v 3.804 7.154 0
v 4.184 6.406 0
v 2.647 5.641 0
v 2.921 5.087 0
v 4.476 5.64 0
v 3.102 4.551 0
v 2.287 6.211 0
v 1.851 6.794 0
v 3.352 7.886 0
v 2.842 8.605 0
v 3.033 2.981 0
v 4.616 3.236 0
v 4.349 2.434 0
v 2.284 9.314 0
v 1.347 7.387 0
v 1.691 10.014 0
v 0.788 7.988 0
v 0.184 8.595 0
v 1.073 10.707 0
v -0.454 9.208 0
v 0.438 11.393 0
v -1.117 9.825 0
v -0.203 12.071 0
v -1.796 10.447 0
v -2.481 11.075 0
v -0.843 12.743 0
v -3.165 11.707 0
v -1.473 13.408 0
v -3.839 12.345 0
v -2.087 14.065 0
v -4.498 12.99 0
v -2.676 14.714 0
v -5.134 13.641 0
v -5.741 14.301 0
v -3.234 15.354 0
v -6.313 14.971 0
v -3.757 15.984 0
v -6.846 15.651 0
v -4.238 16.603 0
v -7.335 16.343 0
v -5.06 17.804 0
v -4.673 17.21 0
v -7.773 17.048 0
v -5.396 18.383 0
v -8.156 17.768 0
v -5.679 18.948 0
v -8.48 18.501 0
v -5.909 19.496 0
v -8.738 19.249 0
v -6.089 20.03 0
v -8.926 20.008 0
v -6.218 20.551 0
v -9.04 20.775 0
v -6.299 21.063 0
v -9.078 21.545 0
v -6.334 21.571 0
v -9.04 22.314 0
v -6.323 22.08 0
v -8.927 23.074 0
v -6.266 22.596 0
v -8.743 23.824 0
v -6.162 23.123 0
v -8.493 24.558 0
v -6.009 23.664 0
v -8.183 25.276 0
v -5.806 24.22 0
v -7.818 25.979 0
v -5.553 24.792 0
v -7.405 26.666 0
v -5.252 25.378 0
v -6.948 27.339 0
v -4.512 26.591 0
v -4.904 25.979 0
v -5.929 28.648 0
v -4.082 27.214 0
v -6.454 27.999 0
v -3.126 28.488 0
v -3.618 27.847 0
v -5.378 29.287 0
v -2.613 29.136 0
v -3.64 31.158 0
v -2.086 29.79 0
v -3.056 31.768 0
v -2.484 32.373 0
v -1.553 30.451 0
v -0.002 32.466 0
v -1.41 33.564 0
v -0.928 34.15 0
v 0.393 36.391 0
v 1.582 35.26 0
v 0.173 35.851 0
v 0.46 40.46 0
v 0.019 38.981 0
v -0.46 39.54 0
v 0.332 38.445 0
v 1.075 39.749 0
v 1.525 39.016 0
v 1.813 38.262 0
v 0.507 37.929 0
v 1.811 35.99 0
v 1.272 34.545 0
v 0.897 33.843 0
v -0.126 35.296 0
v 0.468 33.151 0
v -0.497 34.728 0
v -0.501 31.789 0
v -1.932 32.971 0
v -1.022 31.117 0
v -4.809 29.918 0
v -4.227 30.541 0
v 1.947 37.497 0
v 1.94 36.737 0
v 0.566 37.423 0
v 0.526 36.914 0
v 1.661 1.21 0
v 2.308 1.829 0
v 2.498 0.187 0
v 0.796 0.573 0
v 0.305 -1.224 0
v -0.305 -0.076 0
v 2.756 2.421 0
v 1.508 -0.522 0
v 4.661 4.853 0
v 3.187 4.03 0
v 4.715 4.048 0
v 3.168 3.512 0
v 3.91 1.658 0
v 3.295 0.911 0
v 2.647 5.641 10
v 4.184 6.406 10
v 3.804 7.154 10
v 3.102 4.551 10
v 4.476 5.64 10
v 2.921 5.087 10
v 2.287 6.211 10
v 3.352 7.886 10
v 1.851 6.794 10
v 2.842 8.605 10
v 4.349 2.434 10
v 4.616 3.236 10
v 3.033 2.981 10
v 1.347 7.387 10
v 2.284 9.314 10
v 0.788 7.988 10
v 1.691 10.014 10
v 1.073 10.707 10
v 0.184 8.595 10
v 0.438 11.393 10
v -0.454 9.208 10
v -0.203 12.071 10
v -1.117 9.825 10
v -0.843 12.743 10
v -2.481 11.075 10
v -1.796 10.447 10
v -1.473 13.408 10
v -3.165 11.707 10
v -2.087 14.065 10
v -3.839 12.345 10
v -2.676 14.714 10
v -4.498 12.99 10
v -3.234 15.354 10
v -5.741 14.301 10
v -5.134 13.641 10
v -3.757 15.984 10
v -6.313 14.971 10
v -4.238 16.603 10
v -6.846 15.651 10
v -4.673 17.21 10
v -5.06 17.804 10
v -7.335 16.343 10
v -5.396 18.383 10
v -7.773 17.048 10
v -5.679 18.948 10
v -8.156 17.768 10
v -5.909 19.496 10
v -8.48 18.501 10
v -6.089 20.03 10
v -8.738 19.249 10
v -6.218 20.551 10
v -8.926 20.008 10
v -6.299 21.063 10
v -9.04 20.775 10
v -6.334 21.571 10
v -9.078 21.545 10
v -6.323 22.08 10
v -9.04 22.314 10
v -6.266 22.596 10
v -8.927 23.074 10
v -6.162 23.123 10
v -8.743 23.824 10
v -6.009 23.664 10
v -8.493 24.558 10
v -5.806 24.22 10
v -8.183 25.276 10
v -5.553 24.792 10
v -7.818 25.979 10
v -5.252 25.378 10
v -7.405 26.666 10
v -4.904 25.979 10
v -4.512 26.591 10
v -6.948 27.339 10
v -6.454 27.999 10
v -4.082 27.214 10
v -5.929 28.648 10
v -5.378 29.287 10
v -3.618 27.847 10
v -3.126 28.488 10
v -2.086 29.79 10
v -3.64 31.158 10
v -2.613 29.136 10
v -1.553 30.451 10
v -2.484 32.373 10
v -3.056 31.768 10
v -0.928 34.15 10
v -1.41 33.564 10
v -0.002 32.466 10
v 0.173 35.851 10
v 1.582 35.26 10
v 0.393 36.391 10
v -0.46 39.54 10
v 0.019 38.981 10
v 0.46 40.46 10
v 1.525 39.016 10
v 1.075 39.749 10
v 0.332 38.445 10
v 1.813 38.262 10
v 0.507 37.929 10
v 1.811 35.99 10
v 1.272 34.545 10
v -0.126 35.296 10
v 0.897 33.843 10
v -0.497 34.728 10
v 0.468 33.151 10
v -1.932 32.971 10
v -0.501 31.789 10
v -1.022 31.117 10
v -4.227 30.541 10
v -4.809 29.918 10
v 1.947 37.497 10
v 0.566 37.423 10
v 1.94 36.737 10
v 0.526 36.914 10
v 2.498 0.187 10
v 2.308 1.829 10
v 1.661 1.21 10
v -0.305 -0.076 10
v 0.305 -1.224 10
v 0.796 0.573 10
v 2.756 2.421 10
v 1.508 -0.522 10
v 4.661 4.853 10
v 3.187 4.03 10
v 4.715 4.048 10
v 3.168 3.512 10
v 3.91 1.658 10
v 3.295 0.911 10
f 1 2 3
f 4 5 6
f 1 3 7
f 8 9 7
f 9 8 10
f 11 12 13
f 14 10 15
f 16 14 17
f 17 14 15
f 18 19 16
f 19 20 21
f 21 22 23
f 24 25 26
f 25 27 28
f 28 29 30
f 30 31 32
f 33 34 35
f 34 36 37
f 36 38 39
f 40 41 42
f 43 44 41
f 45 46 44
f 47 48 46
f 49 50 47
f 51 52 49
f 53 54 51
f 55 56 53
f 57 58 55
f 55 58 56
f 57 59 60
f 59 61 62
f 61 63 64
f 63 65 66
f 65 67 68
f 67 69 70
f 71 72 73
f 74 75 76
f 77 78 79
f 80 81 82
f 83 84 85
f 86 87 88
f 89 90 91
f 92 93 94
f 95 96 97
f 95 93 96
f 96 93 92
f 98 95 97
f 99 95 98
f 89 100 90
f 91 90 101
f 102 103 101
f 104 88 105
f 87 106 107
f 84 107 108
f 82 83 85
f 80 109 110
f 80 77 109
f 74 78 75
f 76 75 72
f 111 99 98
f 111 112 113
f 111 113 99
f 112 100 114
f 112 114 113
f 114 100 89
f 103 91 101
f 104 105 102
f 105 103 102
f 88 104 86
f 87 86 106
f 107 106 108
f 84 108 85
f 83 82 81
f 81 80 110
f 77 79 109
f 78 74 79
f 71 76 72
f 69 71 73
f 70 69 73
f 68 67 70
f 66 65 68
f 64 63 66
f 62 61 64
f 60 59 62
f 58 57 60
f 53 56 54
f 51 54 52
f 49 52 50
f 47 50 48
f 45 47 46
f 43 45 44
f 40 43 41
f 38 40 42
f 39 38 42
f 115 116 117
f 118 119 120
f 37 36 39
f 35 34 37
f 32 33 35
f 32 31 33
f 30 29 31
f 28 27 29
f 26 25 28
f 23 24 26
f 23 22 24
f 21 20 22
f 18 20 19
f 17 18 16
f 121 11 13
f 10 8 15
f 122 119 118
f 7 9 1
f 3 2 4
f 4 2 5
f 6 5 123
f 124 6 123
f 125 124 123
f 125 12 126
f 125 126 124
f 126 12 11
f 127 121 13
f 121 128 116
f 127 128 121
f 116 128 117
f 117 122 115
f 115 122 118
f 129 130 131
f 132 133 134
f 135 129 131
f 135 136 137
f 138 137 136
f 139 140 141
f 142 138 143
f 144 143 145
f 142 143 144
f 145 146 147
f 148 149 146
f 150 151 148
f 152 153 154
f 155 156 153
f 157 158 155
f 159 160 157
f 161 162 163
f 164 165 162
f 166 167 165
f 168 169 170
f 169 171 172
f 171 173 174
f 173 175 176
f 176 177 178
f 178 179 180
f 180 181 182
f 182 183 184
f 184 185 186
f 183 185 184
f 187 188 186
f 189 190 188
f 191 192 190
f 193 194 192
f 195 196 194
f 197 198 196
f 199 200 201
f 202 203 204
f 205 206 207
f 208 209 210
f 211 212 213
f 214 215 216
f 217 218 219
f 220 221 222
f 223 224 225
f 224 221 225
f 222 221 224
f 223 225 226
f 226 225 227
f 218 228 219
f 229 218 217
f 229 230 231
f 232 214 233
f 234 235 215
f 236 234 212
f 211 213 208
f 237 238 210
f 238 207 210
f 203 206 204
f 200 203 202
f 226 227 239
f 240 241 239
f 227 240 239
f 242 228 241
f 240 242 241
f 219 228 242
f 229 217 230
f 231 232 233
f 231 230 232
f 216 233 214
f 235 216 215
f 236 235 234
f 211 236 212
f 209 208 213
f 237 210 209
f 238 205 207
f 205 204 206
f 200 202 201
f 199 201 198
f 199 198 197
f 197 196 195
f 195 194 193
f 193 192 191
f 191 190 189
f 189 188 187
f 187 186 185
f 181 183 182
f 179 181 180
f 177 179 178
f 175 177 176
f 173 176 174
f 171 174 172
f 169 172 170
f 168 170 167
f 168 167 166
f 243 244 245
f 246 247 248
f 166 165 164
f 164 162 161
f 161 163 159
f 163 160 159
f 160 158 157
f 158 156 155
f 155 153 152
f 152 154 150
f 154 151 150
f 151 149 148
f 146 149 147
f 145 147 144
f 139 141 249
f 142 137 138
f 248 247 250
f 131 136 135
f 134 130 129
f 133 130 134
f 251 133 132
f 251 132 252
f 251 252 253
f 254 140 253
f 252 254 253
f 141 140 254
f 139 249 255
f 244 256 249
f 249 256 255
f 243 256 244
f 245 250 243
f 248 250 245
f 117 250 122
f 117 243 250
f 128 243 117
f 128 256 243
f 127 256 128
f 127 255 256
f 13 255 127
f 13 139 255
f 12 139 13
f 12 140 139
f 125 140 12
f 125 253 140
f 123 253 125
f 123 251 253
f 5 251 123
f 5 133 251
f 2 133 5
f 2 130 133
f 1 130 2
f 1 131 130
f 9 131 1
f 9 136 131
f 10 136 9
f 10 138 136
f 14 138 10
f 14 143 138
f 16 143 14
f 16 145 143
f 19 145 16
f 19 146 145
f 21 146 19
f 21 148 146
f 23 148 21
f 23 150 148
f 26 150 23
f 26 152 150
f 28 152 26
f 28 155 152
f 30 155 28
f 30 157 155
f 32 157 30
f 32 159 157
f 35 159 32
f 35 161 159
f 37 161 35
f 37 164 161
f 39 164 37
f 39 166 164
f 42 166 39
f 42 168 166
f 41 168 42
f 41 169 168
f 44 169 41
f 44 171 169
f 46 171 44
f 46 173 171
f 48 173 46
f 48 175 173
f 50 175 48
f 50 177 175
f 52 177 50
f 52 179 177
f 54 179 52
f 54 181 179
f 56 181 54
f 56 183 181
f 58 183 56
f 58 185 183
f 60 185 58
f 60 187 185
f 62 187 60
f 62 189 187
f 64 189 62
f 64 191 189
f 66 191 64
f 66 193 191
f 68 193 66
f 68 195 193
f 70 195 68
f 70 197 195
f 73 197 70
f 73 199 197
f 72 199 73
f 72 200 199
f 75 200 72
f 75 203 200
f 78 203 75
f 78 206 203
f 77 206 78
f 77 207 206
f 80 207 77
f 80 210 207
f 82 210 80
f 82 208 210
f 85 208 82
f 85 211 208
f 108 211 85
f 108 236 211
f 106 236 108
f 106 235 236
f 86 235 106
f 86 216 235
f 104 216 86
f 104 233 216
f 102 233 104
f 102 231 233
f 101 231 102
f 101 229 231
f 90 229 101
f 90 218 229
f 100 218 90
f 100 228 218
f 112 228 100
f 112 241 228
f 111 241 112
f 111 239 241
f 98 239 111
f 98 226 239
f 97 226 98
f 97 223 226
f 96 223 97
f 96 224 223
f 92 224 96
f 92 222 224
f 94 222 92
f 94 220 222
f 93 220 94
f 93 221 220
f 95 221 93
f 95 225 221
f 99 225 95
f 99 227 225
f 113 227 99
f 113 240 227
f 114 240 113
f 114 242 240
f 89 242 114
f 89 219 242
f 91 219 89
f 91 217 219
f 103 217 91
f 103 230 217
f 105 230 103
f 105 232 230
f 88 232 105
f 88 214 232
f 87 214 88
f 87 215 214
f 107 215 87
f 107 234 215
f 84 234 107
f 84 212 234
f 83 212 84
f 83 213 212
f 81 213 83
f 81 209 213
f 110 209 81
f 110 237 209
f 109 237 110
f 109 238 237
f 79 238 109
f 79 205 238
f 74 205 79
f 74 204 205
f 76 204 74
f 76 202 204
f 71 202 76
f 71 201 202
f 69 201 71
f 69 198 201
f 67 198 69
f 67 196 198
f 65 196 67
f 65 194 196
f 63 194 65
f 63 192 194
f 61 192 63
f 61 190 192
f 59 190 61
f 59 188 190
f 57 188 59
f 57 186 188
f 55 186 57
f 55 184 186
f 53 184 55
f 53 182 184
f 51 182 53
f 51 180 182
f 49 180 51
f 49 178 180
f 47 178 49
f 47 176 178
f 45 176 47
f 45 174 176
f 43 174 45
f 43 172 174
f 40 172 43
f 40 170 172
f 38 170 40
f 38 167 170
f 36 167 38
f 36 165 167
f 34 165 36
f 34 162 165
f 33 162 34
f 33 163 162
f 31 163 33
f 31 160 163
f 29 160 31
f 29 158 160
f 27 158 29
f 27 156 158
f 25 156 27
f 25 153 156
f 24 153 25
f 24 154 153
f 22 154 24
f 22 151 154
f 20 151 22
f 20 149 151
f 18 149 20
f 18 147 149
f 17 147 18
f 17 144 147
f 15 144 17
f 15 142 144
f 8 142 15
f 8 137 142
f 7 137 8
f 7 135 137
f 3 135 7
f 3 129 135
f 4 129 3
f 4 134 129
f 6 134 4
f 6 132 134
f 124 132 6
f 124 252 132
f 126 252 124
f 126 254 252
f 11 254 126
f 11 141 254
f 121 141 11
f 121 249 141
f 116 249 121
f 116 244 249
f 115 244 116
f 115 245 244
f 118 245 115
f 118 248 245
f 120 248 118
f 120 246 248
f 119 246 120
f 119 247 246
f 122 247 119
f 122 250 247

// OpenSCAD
use <BezierScad.scad>;
bezierSpring(x3=-40.0,y3=20.0);

module bezierSpring(x3,y3) {
	x1=0.0;
	x2=20.0;
	y2=10.0;
	x4=10.0;
	y4=30.0;
	x5=0.0;
	width2=1*1.30;
	width3=4*1.30;
	width4=1*1.30;

	thk=1.30;
	dia1=4.30;
	dia2=dia1-2*thk;
	height=40.0;
	union() {
		bezierCurve();
		//lowerPart();
		//translate([0,height+dia1-thk/2.0]) upperPart();
	}

	module bezierCurve() {
		linear_extrude(height=10)
		BezLine([
			[x1,-thk/2],
			[x2, y2],
			[x3,y3],
			[x4,y4],
			[x5,height]],
			width=[thk,width2,width3,width4,thk],resolution=6,centered=true);
	}

	module lowerPart() {
		translate([-10.0,-dia1,0.0])
		%cube([20, thk, 10], center=false);
		%translate([10,-dia1/2.0])
			difference() {
				cylinder(h=10,d1=dia1,d2=dia1,center=false,$fn=40);
				translate([0,0,-1])
				cylinder(h=12, d1=dia2, d2=dia2,center=false,$fn=40);
				translate([-2*dia1,-dia1,-1])
				cube([2*dia1,2*dia1,12], center=false);			}
		translate([-10.0,-thk,0])
		cube([20,thk,10],center=false);
	}

	module upperPart() {
		translate([-10.0,-dia1,0.0])
		cube([20, thk, 10], center=false);
		%translate([10,-dia1/2,0])
			difference() {
				cylinder(h=10, d1=dia1, d2=dia1 , center=false, $fn=40);
				translate([0,0,-1])
				cylinder(h=12, d1=dia2, d2=dia2 , center=false, $fn=40);
				translate([-2*dia1,-dia1,-1])
				cube([2*dia1,2*dia1,12], center=false);
			}
		%translate([-10.0,-thk,0])
		cube([20, thk, 10], center=false);
	}
}
